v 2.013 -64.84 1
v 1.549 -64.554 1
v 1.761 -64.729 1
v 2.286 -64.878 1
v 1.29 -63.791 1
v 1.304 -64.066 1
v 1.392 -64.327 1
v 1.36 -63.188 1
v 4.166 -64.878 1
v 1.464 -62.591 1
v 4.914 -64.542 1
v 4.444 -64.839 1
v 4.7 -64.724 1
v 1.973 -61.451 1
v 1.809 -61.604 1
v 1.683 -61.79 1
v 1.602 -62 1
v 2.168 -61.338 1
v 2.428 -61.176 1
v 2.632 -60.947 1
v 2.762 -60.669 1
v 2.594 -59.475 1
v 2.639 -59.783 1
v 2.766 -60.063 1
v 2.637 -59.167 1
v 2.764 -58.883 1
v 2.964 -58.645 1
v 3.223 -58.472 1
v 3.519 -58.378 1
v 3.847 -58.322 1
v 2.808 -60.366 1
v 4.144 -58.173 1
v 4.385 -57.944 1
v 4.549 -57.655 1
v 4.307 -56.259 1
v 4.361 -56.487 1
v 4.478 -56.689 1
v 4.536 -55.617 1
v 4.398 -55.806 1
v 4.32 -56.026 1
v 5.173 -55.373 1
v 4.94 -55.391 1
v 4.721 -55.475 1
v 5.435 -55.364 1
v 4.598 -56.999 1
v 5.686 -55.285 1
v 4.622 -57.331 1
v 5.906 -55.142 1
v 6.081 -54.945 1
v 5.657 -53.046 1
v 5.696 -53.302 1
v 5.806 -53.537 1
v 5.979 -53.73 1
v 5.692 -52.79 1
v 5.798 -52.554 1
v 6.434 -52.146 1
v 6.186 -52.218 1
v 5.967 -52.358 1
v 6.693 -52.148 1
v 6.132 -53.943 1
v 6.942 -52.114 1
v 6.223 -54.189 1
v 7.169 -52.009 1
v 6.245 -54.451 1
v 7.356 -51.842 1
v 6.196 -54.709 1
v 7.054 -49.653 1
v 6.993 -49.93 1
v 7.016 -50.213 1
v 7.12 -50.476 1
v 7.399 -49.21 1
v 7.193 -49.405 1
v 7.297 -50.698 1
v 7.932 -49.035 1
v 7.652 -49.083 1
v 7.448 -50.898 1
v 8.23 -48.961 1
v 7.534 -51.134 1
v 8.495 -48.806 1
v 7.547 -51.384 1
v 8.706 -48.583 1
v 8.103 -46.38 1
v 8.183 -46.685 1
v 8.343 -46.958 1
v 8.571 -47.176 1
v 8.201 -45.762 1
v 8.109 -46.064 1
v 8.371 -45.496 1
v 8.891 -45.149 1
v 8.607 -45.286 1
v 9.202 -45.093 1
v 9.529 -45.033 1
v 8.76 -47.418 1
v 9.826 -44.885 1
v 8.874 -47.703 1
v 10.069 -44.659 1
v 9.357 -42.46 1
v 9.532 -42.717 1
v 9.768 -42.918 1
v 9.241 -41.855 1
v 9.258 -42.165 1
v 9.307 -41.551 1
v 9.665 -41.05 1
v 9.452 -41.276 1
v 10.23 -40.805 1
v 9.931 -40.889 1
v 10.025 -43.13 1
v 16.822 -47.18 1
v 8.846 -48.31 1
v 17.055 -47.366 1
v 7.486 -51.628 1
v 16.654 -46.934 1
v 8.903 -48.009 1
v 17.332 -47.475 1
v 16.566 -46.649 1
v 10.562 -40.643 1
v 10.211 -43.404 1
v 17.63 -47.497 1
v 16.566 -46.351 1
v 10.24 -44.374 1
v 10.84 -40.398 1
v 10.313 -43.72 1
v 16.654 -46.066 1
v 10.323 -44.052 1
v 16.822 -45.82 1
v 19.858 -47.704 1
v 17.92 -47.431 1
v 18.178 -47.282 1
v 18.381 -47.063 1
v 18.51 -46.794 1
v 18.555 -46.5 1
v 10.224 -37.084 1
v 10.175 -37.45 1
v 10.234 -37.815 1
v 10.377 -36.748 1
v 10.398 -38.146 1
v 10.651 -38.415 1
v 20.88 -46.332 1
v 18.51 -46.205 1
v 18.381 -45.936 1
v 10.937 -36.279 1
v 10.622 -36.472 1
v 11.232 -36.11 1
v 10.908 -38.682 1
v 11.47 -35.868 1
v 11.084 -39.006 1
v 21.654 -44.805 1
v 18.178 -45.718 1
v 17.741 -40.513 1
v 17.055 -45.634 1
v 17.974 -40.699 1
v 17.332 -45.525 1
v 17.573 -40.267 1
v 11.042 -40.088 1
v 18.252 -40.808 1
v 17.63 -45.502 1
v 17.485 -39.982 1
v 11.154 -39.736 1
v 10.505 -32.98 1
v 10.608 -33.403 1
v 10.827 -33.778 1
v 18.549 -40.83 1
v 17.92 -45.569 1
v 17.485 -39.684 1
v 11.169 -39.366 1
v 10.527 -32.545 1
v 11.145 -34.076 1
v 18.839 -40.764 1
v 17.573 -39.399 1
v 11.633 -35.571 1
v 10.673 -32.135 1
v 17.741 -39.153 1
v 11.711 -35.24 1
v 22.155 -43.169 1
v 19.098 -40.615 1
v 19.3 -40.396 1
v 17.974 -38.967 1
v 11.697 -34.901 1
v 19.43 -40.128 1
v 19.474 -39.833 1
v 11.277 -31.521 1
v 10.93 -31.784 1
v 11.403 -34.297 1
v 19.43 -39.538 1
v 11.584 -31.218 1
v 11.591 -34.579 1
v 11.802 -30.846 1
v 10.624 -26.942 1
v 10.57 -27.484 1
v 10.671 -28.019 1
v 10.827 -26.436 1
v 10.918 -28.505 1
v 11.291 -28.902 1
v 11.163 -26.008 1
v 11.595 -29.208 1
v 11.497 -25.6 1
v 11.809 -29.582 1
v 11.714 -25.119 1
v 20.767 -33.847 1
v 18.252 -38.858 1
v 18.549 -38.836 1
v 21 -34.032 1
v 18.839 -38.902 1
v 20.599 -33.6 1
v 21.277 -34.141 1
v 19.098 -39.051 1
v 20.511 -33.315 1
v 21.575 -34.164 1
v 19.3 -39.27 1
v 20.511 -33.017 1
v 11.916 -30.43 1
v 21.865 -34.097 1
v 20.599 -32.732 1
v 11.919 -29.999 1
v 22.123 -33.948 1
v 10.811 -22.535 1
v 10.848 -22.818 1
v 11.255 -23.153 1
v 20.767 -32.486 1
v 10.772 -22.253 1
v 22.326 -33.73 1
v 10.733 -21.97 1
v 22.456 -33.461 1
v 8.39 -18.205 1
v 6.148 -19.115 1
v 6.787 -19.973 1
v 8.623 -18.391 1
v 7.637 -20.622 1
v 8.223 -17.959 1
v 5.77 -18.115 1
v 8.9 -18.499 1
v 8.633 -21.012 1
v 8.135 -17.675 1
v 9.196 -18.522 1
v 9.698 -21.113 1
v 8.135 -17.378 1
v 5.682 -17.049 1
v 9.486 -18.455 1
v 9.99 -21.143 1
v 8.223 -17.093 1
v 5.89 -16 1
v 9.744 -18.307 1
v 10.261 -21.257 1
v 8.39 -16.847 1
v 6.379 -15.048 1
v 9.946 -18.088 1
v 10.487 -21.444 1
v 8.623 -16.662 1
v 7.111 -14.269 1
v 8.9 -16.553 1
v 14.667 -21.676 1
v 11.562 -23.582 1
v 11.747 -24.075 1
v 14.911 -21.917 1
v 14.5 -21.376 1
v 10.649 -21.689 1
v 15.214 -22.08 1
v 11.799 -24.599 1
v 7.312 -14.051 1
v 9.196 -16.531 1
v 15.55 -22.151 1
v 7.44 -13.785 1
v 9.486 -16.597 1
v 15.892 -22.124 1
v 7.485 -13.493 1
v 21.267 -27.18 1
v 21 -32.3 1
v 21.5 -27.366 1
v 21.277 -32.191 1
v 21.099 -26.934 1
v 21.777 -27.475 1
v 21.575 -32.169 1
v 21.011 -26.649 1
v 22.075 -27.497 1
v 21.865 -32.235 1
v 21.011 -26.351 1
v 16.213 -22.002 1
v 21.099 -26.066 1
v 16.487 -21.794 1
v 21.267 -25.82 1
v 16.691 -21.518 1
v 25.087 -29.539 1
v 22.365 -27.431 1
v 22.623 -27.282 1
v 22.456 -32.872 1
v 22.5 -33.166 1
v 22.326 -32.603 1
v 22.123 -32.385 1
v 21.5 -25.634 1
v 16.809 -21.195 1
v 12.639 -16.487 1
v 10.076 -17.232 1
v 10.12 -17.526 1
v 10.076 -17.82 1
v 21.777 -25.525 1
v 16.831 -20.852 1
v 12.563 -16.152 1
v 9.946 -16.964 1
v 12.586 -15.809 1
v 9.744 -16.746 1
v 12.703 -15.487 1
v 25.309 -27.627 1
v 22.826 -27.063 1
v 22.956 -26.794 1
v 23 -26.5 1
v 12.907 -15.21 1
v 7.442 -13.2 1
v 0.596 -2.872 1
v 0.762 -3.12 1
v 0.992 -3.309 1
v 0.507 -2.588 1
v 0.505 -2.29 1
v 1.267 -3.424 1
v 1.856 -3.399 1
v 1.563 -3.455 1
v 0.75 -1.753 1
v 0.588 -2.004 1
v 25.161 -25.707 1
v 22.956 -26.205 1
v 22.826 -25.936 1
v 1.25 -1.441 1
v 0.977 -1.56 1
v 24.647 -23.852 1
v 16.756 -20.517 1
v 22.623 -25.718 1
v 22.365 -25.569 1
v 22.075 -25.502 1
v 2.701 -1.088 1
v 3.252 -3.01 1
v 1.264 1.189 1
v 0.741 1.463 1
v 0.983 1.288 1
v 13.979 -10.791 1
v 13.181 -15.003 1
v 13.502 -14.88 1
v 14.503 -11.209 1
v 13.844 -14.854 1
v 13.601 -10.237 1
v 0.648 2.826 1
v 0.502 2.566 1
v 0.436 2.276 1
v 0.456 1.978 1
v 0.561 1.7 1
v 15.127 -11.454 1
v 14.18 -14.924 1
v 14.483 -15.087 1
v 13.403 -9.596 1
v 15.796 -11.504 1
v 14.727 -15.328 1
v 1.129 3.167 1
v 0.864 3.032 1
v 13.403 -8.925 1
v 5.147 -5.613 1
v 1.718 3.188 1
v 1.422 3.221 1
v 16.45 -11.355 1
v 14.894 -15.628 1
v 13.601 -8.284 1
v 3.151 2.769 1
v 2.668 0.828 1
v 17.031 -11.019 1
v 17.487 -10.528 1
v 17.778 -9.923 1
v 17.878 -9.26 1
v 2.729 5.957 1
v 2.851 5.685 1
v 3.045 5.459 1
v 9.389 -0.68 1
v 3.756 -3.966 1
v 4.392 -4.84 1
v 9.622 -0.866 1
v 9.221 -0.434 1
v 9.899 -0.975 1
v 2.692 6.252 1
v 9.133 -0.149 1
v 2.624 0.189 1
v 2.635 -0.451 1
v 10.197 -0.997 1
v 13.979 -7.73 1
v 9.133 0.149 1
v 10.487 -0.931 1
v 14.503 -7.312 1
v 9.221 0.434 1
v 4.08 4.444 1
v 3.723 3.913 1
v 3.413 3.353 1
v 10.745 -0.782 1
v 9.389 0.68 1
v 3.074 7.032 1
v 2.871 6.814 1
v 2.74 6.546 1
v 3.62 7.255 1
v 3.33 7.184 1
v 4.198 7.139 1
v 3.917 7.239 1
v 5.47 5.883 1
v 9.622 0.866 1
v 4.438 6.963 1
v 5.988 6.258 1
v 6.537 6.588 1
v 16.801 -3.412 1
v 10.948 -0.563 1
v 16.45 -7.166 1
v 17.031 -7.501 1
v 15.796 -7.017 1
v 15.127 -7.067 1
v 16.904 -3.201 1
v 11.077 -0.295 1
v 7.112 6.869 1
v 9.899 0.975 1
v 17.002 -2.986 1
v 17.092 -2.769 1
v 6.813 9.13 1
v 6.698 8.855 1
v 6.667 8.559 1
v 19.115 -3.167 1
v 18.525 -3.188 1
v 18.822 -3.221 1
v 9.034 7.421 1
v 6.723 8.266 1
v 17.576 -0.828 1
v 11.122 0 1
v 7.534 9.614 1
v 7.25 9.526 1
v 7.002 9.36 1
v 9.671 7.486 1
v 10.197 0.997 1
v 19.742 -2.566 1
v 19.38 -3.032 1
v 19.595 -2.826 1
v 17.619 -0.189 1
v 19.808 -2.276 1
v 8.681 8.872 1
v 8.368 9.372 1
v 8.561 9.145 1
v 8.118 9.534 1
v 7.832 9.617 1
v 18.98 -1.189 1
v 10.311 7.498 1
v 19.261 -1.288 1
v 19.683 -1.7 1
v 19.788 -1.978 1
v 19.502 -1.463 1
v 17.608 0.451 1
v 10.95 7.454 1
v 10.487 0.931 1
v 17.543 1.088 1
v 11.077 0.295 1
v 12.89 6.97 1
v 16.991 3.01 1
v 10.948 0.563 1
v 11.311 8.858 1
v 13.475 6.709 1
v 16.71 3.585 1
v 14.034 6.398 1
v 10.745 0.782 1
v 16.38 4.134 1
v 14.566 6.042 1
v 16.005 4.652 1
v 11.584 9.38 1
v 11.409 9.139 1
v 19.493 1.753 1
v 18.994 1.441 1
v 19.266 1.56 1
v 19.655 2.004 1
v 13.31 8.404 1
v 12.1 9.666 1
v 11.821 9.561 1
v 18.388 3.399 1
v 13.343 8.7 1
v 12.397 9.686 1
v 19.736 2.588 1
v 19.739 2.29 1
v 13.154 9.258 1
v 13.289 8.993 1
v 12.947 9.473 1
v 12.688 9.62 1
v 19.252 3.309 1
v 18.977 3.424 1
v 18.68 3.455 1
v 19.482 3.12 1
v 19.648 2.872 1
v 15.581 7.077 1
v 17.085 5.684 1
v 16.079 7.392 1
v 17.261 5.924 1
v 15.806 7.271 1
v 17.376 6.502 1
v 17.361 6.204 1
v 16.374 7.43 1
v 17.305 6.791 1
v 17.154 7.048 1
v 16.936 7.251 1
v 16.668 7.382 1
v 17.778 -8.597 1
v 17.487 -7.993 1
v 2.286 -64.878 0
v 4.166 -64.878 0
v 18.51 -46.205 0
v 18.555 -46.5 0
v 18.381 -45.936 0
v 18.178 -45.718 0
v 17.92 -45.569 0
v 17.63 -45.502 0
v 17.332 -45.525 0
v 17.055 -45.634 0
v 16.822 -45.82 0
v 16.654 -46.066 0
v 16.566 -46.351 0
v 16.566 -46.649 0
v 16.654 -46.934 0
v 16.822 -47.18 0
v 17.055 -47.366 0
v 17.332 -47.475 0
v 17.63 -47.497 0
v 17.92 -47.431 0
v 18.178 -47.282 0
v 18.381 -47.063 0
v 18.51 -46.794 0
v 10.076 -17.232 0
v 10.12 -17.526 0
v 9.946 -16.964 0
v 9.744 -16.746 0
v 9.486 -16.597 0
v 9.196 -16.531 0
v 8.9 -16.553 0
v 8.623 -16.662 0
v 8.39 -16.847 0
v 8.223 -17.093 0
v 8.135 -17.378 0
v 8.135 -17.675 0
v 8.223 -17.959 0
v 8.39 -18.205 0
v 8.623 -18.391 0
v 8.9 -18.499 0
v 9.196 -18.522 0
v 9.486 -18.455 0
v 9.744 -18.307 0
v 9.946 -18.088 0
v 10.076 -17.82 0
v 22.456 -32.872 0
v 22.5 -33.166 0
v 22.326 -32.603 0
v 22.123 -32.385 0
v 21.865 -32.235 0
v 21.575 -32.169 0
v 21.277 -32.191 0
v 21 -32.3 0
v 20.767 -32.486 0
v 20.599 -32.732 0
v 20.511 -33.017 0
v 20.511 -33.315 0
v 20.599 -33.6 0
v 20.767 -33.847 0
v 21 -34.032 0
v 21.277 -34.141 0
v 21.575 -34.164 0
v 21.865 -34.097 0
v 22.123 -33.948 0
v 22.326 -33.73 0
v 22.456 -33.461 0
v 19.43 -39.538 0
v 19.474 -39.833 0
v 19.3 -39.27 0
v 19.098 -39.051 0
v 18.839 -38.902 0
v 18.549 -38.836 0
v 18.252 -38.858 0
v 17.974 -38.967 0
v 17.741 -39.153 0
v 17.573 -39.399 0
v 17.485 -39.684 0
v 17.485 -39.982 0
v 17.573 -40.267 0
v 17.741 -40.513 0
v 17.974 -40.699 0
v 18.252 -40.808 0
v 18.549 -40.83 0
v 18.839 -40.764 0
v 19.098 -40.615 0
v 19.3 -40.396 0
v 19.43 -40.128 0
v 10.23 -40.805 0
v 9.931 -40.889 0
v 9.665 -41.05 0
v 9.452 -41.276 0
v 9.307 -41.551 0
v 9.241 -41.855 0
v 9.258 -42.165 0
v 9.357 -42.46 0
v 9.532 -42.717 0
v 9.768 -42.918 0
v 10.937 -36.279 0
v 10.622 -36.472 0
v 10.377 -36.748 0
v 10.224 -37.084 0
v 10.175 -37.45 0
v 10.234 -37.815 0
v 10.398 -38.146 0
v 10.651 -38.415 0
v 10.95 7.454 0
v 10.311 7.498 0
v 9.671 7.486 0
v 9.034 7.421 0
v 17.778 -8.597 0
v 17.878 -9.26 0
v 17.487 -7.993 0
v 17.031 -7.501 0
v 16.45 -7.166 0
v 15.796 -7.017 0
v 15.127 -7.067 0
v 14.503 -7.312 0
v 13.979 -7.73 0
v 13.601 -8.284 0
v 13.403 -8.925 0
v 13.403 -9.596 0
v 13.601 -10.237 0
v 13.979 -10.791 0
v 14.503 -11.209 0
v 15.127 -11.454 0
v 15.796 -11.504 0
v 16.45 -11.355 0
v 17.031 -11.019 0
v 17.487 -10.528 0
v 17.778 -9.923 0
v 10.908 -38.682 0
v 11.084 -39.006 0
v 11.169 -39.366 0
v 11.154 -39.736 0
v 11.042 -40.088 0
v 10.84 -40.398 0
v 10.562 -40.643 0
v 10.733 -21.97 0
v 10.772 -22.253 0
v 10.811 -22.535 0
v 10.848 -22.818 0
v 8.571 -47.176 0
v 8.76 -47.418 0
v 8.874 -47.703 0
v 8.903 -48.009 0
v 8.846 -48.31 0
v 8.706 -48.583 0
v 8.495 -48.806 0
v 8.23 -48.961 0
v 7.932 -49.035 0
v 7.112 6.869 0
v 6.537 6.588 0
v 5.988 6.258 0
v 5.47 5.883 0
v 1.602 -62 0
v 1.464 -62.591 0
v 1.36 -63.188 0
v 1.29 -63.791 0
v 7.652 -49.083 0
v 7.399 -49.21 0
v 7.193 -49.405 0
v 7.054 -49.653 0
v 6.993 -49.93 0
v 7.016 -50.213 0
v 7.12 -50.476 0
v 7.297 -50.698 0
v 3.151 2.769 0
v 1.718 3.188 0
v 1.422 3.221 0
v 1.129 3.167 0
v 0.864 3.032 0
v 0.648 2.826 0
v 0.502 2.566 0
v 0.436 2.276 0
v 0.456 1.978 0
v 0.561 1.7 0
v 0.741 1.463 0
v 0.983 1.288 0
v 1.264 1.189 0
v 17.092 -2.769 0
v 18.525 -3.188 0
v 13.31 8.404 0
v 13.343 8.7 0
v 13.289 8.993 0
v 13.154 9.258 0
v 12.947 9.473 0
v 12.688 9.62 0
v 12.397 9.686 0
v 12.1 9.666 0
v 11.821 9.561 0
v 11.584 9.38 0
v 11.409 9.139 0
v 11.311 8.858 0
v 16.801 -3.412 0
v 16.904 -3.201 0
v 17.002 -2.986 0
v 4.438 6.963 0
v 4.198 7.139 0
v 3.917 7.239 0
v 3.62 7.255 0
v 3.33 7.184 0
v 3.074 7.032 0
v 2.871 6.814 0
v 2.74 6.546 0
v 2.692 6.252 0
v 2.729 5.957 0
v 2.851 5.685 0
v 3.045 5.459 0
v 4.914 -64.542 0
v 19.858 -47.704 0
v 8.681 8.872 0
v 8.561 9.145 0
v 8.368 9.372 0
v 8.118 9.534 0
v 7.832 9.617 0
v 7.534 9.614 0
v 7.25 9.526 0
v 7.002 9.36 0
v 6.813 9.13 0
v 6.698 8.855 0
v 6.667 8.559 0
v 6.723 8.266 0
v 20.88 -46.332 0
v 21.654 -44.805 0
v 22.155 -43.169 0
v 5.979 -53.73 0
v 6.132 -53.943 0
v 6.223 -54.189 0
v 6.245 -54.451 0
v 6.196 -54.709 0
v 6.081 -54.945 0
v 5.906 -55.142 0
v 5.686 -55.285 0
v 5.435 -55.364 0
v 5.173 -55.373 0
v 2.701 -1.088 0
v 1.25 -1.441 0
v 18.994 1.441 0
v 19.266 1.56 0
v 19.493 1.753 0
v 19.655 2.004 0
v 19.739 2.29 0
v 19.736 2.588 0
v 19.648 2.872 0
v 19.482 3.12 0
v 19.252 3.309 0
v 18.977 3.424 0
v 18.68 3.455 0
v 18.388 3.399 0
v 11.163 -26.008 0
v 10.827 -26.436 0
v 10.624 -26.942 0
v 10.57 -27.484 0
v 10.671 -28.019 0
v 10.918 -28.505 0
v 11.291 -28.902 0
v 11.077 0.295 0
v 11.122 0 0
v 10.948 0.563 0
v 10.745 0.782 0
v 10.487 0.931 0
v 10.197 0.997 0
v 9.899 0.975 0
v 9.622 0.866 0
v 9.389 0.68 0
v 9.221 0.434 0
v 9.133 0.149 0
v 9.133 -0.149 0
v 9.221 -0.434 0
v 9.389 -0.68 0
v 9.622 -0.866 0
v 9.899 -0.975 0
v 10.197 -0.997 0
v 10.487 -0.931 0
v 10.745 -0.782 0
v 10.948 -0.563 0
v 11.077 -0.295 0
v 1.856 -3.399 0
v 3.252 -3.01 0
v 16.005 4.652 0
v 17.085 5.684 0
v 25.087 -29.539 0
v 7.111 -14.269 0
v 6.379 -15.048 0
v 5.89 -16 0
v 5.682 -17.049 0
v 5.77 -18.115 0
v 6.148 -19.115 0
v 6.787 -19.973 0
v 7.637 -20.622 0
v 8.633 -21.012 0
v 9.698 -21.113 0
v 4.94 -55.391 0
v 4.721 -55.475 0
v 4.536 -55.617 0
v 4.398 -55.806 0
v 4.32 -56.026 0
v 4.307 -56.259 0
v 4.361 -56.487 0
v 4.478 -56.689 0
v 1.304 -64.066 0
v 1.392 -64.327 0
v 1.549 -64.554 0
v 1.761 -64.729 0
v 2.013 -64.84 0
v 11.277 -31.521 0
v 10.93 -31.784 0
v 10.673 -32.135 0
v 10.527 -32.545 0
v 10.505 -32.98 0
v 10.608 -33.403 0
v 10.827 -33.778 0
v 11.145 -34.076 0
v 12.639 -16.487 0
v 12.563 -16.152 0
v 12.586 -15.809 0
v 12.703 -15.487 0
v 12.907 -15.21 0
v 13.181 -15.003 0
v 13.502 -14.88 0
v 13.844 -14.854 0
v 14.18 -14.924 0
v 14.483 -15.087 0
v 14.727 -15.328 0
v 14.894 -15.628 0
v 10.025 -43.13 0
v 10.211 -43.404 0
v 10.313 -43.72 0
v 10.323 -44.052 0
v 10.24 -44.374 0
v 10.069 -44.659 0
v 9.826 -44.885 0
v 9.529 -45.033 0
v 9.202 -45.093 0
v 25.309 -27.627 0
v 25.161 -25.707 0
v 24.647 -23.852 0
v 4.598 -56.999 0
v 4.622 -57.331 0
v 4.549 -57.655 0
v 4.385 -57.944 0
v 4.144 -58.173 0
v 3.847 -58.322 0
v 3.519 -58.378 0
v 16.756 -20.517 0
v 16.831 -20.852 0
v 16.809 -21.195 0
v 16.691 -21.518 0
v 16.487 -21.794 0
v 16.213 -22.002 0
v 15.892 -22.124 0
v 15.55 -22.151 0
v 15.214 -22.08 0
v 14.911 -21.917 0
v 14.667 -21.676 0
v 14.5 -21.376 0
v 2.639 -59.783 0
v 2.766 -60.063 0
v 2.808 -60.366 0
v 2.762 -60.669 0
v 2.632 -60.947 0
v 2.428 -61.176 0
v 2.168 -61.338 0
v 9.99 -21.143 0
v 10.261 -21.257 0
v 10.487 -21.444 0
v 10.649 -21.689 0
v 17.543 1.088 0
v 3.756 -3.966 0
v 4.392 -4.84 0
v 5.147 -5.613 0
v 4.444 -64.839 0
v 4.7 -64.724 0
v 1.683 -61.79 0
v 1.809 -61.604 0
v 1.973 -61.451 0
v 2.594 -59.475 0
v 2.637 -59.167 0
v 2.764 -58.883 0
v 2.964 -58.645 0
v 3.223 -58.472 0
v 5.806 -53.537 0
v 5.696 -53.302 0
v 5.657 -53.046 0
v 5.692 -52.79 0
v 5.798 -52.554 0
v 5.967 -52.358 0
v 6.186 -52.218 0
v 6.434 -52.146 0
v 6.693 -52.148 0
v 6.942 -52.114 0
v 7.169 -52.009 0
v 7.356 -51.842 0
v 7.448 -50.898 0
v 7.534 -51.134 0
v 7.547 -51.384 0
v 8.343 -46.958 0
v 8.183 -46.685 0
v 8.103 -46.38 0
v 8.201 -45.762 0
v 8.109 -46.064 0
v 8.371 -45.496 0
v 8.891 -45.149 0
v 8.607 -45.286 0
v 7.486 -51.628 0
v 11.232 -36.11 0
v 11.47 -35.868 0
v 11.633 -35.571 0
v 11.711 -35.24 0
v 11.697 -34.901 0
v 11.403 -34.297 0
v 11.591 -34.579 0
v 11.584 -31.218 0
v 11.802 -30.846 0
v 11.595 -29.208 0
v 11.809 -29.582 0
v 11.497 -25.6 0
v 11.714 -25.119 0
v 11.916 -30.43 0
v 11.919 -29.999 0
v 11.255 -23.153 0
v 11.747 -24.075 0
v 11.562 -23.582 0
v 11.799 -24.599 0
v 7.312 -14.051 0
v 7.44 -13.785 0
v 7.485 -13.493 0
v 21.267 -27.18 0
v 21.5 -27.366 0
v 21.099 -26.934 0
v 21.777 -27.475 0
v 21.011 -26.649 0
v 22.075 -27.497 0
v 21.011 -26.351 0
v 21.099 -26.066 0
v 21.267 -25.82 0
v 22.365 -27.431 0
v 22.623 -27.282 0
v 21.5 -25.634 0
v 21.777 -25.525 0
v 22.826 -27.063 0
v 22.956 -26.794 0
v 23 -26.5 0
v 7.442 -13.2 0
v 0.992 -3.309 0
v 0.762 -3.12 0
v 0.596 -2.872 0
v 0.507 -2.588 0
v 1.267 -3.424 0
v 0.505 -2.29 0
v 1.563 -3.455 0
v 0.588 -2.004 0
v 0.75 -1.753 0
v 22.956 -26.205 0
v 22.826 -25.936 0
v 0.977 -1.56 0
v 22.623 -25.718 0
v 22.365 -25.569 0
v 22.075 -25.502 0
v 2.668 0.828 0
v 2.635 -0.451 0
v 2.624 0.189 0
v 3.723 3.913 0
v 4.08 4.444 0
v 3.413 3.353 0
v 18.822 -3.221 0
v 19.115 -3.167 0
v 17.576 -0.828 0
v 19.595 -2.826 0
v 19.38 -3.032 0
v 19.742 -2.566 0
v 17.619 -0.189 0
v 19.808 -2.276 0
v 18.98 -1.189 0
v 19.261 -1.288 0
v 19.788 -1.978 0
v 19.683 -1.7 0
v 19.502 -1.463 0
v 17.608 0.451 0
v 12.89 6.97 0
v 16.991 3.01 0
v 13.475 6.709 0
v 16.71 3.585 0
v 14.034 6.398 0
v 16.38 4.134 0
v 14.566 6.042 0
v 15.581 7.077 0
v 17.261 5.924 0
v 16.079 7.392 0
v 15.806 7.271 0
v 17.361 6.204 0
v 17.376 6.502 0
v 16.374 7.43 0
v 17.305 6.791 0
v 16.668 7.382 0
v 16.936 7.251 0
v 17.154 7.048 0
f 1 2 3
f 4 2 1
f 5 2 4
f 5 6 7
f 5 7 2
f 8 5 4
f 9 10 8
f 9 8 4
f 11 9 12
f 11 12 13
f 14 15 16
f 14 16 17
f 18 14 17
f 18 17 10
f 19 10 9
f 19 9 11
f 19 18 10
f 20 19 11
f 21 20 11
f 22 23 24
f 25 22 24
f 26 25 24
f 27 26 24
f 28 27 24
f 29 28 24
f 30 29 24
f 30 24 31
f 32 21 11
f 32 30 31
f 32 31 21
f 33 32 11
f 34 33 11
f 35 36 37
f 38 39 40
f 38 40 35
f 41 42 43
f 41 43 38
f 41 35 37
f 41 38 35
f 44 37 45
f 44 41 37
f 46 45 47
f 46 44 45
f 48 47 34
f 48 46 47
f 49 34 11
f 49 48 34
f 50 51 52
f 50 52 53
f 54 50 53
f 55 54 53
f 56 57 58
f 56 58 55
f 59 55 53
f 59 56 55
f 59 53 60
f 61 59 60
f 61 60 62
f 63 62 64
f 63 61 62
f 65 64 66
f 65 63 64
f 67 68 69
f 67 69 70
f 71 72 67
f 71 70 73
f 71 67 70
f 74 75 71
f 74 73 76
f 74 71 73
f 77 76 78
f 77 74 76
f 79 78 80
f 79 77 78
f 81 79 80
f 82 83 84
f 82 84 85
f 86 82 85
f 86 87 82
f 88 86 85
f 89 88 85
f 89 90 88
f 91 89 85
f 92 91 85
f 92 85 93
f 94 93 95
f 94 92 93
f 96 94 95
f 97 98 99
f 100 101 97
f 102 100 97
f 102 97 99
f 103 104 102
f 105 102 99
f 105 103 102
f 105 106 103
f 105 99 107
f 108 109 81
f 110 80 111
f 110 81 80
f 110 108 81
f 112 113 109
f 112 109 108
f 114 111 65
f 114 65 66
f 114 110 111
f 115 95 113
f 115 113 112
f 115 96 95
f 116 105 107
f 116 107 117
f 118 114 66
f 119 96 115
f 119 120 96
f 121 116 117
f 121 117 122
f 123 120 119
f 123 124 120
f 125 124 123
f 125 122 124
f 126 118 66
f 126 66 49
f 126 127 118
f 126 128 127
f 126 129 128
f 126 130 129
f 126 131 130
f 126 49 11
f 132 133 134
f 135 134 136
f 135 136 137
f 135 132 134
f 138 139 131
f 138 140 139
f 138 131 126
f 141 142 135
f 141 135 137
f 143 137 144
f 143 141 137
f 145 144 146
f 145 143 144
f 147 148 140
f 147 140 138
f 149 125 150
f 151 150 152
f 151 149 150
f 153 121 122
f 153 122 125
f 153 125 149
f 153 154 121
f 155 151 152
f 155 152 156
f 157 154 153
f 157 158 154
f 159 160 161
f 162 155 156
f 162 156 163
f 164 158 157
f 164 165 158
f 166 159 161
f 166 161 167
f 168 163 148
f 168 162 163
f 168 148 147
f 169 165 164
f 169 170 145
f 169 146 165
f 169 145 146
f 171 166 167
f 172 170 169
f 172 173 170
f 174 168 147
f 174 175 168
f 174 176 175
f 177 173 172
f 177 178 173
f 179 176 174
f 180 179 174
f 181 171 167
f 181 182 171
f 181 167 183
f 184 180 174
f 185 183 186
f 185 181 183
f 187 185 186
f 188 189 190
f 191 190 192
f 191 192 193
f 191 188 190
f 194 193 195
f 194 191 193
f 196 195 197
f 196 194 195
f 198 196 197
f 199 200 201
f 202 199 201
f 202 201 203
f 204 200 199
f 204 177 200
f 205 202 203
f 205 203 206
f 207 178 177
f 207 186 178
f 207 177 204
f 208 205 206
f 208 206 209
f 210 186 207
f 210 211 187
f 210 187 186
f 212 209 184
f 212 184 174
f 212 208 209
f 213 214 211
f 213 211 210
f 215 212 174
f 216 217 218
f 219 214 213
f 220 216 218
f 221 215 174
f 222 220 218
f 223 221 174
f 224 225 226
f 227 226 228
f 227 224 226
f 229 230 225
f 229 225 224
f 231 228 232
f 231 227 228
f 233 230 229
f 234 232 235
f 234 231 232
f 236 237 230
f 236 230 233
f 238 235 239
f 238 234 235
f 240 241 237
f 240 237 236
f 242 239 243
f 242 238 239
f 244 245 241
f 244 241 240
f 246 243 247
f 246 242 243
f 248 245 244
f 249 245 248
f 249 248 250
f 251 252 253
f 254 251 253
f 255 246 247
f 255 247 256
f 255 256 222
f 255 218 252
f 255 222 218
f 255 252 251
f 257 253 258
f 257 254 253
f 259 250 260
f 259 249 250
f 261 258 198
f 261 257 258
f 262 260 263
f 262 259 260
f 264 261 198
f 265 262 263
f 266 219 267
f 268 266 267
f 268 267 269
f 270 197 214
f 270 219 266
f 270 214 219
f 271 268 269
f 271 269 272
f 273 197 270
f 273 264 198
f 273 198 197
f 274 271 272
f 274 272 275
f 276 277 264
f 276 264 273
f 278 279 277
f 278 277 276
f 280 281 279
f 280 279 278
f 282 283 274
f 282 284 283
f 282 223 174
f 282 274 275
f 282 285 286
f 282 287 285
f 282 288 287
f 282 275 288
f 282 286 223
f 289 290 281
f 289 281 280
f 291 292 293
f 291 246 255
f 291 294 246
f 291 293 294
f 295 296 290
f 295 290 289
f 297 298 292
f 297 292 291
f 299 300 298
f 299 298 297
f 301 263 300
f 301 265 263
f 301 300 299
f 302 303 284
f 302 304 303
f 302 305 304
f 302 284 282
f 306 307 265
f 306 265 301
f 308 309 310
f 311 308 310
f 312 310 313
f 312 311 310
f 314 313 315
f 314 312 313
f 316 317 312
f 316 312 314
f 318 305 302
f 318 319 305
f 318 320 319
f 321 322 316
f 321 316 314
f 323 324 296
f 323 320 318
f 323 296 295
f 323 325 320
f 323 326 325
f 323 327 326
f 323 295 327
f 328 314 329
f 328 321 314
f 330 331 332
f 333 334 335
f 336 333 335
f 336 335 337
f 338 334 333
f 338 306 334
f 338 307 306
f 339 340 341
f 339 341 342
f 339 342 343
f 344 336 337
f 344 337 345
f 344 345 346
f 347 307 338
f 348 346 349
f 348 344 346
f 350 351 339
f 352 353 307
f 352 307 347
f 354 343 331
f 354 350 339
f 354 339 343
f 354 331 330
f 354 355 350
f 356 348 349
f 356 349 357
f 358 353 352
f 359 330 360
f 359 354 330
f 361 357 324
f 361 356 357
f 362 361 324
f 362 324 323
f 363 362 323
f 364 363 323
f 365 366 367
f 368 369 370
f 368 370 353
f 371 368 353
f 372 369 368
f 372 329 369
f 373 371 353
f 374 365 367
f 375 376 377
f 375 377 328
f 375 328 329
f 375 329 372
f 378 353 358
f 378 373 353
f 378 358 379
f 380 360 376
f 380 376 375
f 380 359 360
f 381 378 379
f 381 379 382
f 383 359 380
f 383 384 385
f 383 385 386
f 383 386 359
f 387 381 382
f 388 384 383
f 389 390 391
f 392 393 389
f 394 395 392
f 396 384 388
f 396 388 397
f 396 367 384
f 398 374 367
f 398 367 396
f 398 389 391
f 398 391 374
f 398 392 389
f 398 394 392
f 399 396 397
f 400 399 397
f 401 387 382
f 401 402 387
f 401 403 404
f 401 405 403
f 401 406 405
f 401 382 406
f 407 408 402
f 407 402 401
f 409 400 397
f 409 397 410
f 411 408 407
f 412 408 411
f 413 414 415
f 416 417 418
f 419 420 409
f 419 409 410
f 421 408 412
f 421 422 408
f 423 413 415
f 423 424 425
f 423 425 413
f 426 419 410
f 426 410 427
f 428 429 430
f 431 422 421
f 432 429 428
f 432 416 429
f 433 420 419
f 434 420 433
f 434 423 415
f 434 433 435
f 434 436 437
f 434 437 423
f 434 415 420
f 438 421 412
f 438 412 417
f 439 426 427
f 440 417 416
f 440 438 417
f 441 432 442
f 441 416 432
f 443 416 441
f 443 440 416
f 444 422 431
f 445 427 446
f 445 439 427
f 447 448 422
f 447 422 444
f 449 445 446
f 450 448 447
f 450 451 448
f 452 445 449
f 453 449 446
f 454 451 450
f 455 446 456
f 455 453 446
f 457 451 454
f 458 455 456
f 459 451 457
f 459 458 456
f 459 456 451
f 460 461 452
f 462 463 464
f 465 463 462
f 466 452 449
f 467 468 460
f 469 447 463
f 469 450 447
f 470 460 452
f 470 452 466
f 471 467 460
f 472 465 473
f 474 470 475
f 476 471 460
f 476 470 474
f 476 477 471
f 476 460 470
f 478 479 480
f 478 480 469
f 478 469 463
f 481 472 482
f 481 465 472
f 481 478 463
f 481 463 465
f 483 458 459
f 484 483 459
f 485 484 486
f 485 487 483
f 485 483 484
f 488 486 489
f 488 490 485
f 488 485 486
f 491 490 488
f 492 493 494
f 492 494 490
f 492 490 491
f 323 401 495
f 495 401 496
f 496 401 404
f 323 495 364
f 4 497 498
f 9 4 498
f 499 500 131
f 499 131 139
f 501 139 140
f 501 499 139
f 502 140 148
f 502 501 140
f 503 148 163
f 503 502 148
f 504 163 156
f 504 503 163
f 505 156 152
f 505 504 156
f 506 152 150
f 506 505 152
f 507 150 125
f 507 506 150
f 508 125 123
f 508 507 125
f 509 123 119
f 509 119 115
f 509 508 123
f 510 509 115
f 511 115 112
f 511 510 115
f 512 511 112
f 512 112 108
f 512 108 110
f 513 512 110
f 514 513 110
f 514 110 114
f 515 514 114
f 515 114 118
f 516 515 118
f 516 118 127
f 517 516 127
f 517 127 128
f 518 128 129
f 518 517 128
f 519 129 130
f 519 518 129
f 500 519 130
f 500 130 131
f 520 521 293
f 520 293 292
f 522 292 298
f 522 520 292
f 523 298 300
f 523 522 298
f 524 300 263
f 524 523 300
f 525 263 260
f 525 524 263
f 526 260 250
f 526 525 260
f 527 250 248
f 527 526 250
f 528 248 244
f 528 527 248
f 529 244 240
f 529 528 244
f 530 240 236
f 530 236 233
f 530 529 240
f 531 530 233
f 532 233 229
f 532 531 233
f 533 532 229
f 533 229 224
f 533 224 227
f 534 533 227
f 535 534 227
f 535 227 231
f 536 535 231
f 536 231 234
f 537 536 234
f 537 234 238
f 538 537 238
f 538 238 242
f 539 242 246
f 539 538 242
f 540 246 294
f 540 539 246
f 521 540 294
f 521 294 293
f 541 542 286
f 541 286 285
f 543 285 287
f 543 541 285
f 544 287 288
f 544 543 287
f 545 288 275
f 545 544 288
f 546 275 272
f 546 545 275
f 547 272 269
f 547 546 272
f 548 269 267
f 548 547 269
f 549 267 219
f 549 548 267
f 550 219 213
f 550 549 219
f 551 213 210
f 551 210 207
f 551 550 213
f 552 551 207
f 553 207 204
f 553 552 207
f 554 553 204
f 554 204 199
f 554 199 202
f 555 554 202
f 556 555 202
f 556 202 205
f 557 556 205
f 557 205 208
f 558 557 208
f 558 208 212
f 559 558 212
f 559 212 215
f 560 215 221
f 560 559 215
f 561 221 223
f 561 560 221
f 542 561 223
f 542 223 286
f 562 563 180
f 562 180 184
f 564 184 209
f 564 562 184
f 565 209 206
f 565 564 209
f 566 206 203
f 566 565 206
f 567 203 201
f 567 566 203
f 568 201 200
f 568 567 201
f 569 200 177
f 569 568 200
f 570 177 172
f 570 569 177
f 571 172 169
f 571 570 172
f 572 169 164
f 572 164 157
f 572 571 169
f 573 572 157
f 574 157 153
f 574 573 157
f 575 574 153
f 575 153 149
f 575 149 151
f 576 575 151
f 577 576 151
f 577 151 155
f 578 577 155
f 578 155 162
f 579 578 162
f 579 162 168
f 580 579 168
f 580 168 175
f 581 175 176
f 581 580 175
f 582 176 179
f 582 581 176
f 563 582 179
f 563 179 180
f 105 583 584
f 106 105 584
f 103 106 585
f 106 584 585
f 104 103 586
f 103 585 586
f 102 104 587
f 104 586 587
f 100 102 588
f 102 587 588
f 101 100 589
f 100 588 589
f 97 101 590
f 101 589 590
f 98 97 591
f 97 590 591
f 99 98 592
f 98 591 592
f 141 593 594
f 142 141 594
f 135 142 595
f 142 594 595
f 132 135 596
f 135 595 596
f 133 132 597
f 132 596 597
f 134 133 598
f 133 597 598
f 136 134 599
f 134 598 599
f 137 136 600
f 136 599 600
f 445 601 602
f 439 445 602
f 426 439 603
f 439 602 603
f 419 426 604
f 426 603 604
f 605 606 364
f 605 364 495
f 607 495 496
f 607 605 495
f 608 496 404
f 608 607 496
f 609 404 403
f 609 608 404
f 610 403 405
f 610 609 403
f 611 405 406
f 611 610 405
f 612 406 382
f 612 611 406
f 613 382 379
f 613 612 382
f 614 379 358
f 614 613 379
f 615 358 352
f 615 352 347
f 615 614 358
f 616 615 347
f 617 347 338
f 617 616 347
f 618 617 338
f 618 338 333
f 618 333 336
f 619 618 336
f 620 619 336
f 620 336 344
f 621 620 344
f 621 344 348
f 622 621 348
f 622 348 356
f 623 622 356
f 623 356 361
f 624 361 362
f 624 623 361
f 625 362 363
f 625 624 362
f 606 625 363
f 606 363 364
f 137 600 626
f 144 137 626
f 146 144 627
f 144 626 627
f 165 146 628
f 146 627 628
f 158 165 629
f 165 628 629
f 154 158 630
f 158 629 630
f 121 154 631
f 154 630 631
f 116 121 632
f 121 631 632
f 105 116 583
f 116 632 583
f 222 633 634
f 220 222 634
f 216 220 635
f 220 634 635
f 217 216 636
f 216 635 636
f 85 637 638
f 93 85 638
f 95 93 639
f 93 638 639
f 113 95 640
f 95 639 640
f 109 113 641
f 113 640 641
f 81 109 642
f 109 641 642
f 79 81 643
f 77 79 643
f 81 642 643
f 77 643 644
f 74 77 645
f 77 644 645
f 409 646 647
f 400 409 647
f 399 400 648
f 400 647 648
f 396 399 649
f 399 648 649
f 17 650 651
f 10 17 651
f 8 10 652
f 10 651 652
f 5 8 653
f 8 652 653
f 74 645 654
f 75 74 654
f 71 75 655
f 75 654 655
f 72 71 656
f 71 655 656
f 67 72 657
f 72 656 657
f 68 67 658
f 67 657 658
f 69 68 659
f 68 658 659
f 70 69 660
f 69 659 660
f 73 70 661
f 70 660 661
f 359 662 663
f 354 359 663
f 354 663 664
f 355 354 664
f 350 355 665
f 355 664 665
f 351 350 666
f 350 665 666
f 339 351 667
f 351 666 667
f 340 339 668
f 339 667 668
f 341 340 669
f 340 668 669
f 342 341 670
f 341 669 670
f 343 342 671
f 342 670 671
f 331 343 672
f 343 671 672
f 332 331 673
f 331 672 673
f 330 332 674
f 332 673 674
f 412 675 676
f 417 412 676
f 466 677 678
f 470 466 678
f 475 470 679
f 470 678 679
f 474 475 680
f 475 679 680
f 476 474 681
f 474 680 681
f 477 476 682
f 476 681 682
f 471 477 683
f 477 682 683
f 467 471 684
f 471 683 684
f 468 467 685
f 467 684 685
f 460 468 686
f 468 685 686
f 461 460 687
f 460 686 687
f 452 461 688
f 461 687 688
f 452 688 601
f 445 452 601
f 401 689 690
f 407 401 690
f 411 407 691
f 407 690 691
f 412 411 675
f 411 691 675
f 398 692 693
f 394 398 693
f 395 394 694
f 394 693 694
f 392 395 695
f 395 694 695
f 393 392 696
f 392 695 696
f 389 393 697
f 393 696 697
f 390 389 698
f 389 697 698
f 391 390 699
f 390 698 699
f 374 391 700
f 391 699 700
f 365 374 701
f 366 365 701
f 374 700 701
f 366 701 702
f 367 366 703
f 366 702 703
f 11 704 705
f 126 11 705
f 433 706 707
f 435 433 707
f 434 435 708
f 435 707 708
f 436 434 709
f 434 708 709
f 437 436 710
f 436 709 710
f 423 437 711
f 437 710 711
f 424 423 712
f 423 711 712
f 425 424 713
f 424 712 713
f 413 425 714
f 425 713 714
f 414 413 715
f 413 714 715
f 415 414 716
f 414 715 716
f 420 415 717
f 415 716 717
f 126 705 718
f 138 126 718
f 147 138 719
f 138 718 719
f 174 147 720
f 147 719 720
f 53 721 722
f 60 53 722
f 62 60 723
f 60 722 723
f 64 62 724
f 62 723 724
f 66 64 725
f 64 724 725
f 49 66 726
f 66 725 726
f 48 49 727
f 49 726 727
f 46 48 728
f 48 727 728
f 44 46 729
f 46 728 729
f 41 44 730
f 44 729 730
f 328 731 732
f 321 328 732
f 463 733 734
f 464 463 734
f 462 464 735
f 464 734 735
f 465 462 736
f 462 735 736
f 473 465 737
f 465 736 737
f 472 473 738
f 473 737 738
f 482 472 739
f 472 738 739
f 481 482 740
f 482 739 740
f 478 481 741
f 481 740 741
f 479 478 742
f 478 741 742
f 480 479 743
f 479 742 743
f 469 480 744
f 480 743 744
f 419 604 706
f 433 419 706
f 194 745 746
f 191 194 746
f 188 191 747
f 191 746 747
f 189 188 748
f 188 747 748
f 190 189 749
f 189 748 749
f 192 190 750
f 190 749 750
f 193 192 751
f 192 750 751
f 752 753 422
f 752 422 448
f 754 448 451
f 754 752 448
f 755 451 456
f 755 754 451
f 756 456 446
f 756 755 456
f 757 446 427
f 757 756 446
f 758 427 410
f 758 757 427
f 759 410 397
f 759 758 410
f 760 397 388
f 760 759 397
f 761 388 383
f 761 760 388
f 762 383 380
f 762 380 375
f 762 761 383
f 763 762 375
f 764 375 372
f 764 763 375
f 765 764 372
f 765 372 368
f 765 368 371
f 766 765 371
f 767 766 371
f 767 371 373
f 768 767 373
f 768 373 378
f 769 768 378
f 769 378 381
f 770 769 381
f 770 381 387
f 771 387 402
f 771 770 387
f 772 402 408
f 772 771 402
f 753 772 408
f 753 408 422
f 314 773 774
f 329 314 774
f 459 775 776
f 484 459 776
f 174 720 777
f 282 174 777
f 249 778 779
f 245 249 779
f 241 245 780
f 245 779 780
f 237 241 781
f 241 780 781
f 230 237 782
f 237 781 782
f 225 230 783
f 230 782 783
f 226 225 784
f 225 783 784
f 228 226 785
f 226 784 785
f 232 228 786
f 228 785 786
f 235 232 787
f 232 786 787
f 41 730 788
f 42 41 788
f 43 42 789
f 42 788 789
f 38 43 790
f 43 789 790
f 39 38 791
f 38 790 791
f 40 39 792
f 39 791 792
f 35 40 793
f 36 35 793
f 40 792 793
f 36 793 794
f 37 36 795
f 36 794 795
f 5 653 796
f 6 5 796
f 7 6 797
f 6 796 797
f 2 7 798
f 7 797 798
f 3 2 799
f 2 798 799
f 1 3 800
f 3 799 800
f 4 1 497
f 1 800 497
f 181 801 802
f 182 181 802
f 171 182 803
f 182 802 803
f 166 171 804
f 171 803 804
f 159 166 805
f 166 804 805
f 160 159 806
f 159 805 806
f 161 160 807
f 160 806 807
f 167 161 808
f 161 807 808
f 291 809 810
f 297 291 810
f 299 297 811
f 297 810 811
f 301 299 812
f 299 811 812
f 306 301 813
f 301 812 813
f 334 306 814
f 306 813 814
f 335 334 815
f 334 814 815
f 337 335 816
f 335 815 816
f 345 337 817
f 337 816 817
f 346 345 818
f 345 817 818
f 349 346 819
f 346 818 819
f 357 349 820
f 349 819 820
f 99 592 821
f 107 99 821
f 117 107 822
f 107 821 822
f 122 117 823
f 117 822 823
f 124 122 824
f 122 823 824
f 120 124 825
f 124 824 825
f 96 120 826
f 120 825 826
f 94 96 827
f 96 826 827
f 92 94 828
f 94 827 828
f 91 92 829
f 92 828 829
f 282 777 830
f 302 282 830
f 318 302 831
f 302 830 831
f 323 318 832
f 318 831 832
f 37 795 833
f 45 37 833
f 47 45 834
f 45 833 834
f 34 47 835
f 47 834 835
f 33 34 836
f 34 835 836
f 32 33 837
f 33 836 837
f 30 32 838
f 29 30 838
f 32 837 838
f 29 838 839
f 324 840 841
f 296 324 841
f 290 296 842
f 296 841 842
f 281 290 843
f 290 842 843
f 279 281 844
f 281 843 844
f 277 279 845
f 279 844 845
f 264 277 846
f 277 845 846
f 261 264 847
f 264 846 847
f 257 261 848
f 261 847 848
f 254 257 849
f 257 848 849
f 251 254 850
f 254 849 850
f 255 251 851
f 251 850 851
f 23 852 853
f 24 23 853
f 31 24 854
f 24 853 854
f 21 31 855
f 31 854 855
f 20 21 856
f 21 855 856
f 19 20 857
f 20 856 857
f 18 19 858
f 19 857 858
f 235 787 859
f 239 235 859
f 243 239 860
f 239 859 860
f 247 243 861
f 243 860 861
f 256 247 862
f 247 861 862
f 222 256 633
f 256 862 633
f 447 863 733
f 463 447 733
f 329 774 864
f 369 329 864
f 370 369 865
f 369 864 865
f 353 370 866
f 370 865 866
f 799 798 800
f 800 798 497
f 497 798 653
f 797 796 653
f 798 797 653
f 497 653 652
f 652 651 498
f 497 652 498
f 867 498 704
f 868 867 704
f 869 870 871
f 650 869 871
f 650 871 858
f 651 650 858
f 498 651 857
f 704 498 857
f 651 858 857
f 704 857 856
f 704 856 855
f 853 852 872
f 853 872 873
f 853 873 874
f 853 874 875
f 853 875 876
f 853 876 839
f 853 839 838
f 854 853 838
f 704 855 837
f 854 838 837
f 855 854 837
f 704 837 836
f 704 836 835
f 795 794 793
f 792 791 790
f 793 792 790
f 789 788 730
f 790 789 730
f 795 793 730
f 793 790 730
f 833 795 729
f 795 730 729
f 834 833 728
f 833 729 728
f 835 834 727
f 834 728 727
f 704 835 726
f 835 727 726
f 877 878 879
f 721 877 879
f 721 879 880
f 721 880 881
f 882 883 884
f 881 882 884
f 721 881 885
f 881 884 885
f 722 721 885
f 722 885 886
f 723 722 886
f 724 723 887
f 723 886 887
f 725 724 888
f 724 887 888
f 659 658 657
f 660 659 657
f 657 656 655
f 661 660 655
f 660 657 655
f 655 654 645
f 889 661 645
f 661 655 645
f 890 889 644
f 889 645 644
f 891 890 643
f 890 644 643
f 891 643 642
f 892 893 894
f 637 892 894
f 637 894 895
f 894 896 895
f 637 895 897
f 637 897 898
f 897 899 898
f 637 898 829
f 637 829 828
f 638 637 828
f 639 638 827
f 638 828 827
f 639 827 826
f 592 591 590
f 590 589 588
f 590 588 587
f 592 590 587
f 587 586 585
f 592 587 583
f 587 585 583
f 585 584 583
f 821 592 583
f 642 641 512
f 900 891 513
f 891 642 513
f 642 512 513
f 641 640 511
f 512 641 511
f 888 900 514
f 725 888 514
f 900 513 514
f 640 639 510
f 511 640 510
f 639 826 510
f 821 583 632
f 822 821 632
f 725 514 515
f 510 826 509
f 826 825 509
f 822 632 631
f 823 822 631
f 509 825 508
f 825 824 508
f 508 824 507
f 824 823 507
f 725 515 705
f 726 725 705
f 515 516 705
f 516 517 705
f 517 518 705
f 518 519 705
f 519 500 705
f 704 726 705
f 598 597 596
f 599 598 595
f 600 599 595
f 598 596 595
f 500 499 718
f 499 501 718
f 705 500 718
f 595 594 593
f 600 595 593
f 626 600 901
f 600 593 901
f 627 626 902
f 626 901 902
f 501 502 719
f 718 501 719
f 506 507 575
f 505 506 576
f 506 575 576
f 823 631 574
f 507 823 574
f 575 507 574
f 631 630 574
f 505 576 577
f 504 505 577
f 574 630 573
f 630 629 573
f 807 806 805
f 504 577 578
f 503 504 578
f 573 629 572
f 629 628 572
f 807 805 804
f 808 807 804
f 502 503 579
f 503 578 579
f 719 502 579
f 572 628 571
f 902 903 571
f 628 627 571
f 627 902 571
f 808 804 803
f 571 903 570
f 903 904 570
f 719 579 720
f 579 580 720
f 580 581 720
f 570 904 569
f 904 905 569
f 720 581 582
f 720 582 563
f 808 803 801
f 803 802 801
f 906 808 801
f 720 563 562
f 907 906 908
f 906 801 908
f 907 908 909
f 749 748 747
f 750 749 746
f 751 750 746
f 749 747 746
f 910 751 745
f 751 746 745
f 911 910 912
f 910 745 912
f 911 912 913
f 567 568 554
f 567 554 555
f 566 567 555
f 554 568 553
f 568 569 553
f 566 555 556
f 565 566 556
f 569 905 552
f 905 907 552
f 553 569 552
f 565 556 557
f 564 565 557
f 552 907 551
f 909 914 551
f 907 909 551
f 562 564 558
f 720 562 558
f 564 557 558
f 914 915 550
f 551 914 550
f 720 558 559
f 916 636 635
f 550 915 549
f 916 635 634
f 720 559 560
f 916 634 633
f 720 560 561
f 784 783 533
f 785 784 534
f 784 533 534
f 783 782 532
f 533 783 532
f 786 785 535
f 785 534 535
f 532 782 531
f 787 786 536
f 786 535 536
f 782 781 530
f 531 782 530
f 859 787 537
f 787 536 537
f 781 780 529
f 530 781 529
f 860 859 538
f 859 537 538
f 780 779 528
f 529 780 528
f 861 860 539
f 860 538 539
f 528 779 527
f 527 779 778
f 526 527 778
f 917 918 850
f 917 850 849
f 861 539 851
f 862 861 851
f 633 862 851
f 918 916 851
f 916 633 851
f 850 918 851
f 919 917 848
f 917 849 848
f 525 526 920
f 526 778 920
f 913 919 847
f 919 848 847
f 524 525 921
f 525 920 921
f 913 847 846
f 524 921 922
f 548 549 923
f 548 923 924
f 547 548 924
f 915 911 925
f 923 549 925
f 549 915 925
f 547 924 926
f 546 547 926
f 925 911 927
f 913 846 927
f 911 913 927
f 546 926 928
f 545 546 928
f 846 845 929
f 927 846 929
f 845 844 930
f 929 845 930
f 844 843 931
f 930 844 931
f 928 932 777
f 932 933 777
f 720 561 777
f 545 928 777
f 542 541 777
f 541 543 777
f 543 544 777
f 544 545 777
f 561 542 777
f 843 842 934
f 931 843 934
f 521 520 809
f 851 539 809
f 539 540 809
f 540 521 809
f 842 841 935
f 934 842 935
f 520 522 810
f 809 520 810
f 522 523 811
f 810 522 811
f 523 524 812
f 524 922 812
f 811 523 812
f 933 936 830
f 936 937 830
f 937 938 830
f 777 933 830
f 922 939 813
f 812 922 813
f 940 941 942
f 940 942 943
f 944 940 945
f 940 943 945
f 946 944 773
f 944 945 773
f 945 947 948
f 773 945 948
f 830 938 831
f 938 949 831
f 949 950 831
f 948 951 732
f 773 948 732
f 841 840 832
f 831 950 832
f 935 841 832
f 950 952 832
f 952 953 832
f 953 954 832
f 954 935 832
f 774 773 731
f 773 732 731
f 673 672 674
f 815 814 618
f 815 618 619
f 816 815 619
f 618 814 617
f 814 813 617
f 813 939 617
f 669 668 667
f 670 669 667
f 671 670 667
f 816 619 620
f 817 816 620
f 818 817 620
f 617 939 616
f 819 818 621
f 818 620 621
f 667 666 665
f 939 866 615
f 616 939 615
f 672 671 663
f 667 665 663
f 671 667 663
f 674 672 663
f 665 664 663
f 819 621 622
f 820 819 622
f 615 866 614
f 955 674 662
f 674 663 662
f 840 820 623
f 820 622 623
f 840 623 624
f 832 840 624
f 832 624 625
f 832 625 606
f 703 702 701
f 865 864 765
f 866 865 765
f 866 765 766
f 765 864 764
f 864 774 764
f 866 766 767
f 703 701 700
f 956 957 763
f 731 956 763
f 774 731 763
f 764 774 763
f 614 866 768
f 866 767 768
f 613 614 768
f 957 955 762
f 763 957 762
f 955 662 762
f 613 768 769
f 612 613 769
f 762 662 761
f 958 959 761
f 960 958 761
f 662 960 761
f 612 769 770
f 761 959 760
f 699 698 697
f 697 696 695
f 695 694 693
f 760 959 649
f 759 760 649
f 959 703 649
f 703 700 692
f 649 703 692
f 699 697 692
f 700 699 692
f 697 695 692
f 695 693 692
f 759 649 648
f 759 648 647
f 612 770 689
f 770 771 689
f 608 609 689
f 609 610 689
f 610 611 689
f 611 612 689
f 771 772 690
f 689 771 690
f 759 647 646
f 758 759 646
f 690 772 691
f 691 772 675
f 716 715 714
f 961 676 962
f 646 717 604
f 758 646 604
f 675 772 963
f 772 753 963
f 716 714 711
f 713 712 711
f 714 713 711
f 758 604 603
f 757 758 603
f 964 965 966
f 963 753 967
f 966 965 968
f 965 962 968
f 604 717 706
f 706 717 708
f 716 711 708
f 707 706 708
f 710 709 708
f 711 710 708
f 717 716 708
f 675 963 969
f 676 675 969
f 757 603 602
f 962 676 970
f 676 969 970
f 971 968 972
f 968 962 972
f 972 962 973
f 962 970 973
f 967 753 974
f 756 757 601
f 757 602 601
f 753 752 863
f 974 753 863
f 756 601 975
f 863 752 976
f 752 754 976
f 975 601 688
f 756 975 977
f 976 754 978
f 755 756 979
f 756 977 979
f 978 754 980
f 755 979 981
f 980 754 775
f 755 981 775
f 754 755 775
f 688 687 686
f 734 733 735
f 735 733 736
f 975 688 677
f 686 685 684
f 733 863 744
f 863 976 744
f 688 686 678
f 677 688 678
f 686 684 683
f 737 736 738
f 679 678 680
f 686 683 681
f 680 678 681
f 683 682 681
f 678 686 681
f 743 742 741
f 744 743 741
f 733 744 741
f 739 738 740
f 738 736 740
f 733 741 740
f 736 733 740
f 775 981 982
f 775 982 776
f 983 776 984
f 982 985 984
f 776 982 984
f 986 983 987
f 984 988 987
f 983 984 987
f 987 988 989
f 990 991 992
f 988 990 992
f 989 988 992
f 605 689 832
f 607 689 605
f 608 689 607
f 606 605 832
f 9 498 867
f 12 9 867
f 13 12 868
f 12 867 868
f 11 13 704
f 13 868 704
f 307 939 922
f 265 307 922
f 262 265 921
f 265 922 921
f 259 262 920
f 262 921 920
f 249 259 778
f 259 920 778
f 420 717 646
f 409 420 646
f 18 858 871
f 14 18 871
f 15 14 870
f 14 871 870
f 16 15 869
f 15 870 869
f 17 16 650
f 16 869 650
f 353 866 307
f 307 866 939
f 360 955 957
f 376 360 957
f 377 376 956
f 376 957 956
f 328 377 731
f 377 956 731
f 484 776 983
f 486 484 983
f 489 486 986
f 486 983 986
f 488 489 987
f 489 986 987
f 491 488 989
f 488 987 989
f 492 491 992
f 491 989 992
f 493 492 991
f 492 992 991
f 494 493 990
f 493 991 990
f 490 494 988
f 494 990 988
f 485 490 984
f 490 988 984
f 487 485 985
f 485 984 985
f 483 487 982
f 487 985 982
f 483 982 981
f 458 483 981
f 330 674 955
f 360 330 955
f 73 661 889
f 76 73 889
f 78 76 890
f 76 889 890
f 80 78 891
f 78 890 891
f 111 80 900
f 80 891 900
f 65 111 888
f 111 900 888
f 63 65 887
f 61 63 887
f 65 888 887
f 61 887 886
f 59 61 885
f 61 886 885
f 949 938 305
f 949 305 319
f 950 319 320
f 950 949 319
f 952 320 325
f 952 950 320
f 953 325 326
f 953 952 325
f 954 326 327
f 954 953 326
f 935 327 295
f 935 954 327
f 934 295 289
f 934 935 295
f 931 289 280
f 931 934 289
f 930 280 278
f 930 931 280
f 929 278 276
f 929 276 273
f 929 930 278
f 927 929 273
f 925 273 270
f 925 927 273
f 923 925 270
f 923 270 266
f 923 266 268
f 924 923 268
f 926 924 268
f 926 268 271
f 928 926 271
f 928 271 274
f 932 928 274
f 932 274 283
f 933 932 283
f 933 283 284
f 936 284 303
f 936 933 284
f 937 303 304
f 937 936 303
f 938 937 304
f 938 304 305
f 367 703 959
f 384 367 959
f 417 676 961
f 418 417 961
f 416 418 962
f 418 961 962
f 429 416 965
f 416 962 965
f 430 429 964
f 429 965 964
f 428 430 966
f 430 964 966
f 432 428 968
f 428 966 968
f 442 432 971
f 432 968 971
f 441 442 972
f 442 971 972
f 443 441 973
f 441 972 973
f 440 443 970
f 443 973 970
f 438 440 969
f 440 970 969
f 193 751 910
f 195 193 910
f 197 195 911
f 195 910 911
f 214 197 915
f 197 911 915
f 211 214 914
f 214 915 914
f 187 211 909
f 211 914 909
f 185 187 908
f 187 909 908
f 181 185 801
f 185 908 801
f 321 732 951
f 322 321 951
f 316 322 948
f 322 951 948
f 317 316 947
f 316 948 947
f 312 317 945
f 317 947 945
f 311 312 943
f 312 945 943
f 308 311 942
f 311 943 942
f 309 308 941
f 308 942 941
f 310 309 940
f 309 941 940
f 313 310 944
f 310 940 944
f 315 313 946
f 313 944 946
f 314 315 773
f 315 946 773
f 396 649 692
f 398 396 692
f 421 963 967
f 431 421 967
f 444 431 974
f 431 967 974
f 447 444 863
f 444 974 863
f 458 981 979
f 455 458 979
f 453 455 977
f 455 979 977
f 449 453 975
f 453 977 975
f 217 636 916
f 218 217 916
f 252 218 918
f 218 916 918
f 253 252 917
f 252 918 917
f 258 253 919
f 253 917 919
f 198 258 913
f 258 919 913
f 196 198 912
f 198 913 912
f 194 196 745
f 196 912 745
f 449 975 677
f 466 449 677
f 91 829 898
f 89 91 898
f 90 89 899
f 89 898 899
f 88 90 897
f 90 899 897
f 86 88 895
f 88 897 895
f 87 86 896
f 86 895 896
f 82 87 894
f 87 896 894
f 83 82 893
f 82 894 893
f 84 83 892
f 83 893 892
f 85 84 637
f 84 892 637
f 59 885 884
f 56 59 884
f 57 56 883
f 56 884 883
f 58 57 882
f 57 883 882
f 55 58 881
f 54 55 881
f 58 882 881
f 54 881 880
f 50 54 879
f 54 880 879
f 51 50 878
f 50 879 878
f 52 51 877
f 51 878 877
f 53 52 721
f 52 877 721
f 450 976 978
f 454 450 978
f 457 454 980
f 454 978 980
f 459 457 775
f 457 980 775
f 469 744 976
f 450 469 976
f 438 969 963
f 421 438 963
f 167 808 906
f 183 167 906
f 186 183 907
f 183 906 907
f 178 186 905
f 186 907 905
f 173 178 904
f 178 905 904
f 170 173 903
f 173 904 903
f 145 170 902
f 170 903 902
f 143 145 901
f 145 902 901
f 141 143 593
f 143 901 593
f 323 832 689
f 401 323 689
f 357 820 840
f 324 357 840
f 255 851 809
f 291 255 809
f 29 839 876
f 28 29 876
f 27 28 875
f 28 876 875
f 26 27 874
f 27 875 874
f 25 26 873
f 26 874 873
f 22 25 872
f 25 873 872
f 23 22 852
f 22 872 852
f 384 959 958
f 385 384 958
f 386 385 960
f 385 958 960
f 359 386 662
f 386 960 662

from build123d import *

# Parameters (mm, degrees)
SKETCH1_R           = 1
SKETCH1_R_2         = 2.25
SKETCH1_R_3         = 0.998074624
BOSS_EXTRUDE2_DEPTH = 1


with BuildPart() as part:
    # Sketch1 → Boss-Extrude2 (new body)
    with BuildSketch(Plane.XY):
        with BuildLine():
            Line((5.146977165, -5.612602972), (7.44171219, -13.199988708))
            ThreePointArc((7.44171219, -13.199988708), (7.439945118, -13.784749424), (7.111476, -14.268543033))
            ThreePointArc((7.111476, -14.268543033), (5.923924569, -18.62818009), (9.697794763, -21.113057841))
            ThreePointArc((9.697794763, -21.113057841), (10.380528536, -21.341854348), (10.732574986, -21.969975788))
            ThreePointArc((10.732574986, -21.969975788), (10.79176698, -22.393908793), (10.847713449, -22.818282305))
            ThreePointArc((10.847713449, -22.818282305), (11.790244876, -24.335347863), (11.163215941, -26.007678007))
            ThreePointArc((11.163215941, -26.007678007), (10.570290463, -27.483765064), (11.290805177, -28.901951289))
            ThreePointArc((11.290805177, -28.901951289), (11.931562756, -30.214937196), (11.277042335, -31.52111685))
            ThreePointArc((11.277042335, -31.52111685), (10.500432467, -32.761716535), (11.145287396, -34.075631519))
            ThreePointArc((11.145287396, -34.075631519), (11.711049486, -35.240414103), (10.937199745, -36.278663489))
            ThreePointArc((10.937199745, -36.278663489), (10.185540032, -37.265502357), (10.650830557, -38.415436269))
            ThreePointArc((10.650830557, -38.415436269), (11.153884573, -39.735845823), (10.230304321, -40.805212107))
            ThreePointArc((10.230304321, -40.805212107), (9.263580844, -41.700908083), (9.768401259, -42.918274877))
            ThreePointArc((9.768401259, -42.918274877), (10.29278617, -44.215864041), (9.202326649, -45.093141196))
            ThreePointArc((9.202326649, -45.093141196), (8.144843355, -45.909982105), (8.571180325, -47.176369398))
            ThreePointArc((8.571180325, -47.176369398), (8.845608938, -48.309992252), (7.932024848, -49.035096348))
            ThreePointArc((7.932024848, -49.035096348), (7.054134874, -49.652663659), (7.297145805, -50.698142438))
            ThreePointArc((7.297145805, -50.698142438), (7.486031135, -51.627523472), (6.693279806, -52.148073283))
            ThreePointArc((6.693279806, -52.148073283), (5.736341709, -52.667939714), (5.979078831, -53.729575393))
            ThreePointArc((5.979078831, -53.729575393), (6.146574337, -54.831276595), (5.172832259, -55.373149872))
            ThreePointArc((5.172832259, -55.373149872), (4.397991341, -55.805643097), (4.477975588, -56.689402883))
            ThreePointArc((4.477975588, -56.689402883), (4.477842946, -57.805544451), (3.519463877, -58.377629741))
            ThreePointArc((3.519463877, -58.377629741), (2.763689302, -58.882818754), (2.639049746, -59.78330536))
            ThreePointArc((2.639049746, -59.78330536), (2.762025793, -60.669472955), (2.167842085, -61.338324084))
            ThreePointArc((2.167842085, -61.338324084), (1.808869059, -61.604258533), (1.601521968, -61.999973009))
            ThreePointArc((1.601521968, -61.999973009), (1.407536389, -62.888842845), (1.289722883, -63.790973638))
            ThreePointArc((1.289722883, -63.790973638), (1.548602642, -64.553775113), (2.285909866, -64.878217524))
            Line((2.285909866, -64.878217524), (4.16607409, -64.878217524))
            ThreePointArc((4.16607409, -64.878217524), (4.576078061, -64.790301261), (4.913989999, -64.54201101))
            Line((4.913989999, -64.54201101), (19.858030846, -47.704114694))
            ThreePointArc((19.858030846, -47.704114694), (21.299586827, -45.585122466), (22.155211357, -43.169316519))
            Line((22.155211357, -43.169316519), (25.087470282, -29.538838187))
            ThreePointArc((25.087470282, -29.538838187), (25.281255234, -26.663292069), (24.646889926, -23.851904734))
            Line((24.646889926, -23.851904734), (16.800568019, -3.412304746))
            ThreePointArc((16.800568019, -3.412304746), (16.953922391, -3.093842948), (17.092102067, -2.768509492))
            Line((17.092102067, -2.768509492), (18.525386899, -3.188095126))
            ThreePointArc((18.525386899, -3.188095126), (19.785478354, -2.423398267), (18.979727986, -1.189154327))
            Line((18.979727986, -1.189154327), (17.575945858, -0.827918039))
            ThreePointArc((17.575945858, -0.827918039), (17.62064019, 0.130893048), (17.54251106, 1.087560245))
            Line((17.54251106, 1.087560245), (18.993564953, 1.440830843))
            ThreePointArc((18.993564953, 1.440830843), (19.702487734, 2.733123476), (18.387565476, 3.399134899))
            Line((18.387565476, 3.399134899), (16.991236349, 3.010083636))
            ThreePointArc((16.991236349, 3.010083636), (16.550537232, 3.862785562), (16.004541822, 4.652219092))
            Line((16.004541822, 4.652219092), (17.084556057, 5.68368735))
            ThreePointArc((17.084556057, 5.68368735), (17.052354878, 7.157306991), (15.580593087, 7.076628673))
            Line((15.580593087, 7.076628673), (14.565862222, 6.041535833))
            ThreePointArc((14.565862222, 6.041535833), (13.757854628, 6.559647804), (12.890291968, 6.97031959))
            Line((12.890291968, 6.97031959), (13.309877602, 8.403604423))
            ThreePointArc((13.309877602, 8.403604423), (12.545180743, 9.663695877), (11.310936803, 8.857945509))
            Line((11.310936803, 8.857945509), (10.949700516, 7.454163382))
            ThreePointArc((10.949700516, 7.454163382), (9.990889428, 7.498857714), (9.034222232, 7.420728584))
            Line((9.034222232, 7.420728584), (8.680951634, 8.871782476))
            ThreePointArc((8.680951634, 8.871782476), (7.388659, 9.580705258), (6.722647578, 8.265783))
            Line((6.722647578, 8.265783), (7.11169884, 6.869453872))
            ThreePointArc((7.11169884, 6.869453872), (6.258996915, 6.428754755), (5.469563385, 5.882759346))
            Line((5.469563385, 5.882759346), (4.438095126, 6.96277358))
            ThreePointArc((4.438095126, 6.96277358), (2.964475486, 6.930572401), (3.045153803, 5.45881061))
            Line((3.045153803, 5.45881061), (4.080246644, 4.444079745))
            ThreePointArc((4.080246644, 4.444079745), (3.562134673, 3.636072152), (3.151462886, 2.768509492))
            Line((3.151462886, 2.768509492), (1.718178054, 3.188095126))
            ThreePointArc((1.718178054, 3.188095126), (0.458086599, 2.423398267), (1.263836967, 1.189154327))
            Line((1.263836967, 1.189154327), (2.667619095, 0.827918039))
            ThreePointArc((2.667619095, 0.827918039), (2.622924763, -0.130893048), (2.701053893, -1.087560245))
            Line((2.701053893, -1.087560245), (1.25, -1.440830843))
            ThreePointArc((1.25, -1.440830843), (0.541077219, -2.733123476), (1.855999477, -3.399134899))
            Line((1.855999477, -3.399134899), (3.252328604, -3.010083636))
            ThreePointArc((3.252328604, -3.010083636), (4.058376204, -4.414193514), (5.146977165, -5.612602972))
        make_face()
        with Locations((10.121782476, 0)):
            Circle(SKETCH1_R, mode=Mode.SUBTRACT)
        with Locations((15.627966379, -9.260281964)):
            Circle(SKETCH1_R_2, mode=Mode.SUBTRACT)
        with Locations((9.121782476, -17.526259213)):
            Circle(SKETCH1_R_3, mode=Mode.SUBTRACT)
        with Locations((22, -26.49969455)):
            Circle(SKETCH1_R, mode=Mode.SUBTRACT)
        with Locations((21.5, -33.166361217)):
            Circle(SKETCH1_R, mode=Mode.SUBTRACT)
        with Locations((18.474150388, -39.833027883)):
            Circle(SKETCH1_R, mode=Mode.SUBTRACT)
        with Locations((17.55481685, -46.49969455)):
            Circle(SKETCH1_R, mode=Mode.SUBTRACT)
        with BuildLine():
            Line((14.500290742, -21.375988683), (12.638736062, -16.487053928))
            ThreePointArc((12.638736062, -16.487053928), (13.337027802, -14.929994394), (14.894087335, -15.628286133))
            Line((14.894087335, -15.628286133), (16.755642015, -20.517220889))
            ThreePointArc((16.755642015, -20.517220889), (16.057350276, -22.074280422), (14.500290742, -21.375988683))
        make_face(mode=Mode.SUBTRACT)
    extrude(amount=BOSS_EXTRUDE2_DEPTH)


solid = part.part
